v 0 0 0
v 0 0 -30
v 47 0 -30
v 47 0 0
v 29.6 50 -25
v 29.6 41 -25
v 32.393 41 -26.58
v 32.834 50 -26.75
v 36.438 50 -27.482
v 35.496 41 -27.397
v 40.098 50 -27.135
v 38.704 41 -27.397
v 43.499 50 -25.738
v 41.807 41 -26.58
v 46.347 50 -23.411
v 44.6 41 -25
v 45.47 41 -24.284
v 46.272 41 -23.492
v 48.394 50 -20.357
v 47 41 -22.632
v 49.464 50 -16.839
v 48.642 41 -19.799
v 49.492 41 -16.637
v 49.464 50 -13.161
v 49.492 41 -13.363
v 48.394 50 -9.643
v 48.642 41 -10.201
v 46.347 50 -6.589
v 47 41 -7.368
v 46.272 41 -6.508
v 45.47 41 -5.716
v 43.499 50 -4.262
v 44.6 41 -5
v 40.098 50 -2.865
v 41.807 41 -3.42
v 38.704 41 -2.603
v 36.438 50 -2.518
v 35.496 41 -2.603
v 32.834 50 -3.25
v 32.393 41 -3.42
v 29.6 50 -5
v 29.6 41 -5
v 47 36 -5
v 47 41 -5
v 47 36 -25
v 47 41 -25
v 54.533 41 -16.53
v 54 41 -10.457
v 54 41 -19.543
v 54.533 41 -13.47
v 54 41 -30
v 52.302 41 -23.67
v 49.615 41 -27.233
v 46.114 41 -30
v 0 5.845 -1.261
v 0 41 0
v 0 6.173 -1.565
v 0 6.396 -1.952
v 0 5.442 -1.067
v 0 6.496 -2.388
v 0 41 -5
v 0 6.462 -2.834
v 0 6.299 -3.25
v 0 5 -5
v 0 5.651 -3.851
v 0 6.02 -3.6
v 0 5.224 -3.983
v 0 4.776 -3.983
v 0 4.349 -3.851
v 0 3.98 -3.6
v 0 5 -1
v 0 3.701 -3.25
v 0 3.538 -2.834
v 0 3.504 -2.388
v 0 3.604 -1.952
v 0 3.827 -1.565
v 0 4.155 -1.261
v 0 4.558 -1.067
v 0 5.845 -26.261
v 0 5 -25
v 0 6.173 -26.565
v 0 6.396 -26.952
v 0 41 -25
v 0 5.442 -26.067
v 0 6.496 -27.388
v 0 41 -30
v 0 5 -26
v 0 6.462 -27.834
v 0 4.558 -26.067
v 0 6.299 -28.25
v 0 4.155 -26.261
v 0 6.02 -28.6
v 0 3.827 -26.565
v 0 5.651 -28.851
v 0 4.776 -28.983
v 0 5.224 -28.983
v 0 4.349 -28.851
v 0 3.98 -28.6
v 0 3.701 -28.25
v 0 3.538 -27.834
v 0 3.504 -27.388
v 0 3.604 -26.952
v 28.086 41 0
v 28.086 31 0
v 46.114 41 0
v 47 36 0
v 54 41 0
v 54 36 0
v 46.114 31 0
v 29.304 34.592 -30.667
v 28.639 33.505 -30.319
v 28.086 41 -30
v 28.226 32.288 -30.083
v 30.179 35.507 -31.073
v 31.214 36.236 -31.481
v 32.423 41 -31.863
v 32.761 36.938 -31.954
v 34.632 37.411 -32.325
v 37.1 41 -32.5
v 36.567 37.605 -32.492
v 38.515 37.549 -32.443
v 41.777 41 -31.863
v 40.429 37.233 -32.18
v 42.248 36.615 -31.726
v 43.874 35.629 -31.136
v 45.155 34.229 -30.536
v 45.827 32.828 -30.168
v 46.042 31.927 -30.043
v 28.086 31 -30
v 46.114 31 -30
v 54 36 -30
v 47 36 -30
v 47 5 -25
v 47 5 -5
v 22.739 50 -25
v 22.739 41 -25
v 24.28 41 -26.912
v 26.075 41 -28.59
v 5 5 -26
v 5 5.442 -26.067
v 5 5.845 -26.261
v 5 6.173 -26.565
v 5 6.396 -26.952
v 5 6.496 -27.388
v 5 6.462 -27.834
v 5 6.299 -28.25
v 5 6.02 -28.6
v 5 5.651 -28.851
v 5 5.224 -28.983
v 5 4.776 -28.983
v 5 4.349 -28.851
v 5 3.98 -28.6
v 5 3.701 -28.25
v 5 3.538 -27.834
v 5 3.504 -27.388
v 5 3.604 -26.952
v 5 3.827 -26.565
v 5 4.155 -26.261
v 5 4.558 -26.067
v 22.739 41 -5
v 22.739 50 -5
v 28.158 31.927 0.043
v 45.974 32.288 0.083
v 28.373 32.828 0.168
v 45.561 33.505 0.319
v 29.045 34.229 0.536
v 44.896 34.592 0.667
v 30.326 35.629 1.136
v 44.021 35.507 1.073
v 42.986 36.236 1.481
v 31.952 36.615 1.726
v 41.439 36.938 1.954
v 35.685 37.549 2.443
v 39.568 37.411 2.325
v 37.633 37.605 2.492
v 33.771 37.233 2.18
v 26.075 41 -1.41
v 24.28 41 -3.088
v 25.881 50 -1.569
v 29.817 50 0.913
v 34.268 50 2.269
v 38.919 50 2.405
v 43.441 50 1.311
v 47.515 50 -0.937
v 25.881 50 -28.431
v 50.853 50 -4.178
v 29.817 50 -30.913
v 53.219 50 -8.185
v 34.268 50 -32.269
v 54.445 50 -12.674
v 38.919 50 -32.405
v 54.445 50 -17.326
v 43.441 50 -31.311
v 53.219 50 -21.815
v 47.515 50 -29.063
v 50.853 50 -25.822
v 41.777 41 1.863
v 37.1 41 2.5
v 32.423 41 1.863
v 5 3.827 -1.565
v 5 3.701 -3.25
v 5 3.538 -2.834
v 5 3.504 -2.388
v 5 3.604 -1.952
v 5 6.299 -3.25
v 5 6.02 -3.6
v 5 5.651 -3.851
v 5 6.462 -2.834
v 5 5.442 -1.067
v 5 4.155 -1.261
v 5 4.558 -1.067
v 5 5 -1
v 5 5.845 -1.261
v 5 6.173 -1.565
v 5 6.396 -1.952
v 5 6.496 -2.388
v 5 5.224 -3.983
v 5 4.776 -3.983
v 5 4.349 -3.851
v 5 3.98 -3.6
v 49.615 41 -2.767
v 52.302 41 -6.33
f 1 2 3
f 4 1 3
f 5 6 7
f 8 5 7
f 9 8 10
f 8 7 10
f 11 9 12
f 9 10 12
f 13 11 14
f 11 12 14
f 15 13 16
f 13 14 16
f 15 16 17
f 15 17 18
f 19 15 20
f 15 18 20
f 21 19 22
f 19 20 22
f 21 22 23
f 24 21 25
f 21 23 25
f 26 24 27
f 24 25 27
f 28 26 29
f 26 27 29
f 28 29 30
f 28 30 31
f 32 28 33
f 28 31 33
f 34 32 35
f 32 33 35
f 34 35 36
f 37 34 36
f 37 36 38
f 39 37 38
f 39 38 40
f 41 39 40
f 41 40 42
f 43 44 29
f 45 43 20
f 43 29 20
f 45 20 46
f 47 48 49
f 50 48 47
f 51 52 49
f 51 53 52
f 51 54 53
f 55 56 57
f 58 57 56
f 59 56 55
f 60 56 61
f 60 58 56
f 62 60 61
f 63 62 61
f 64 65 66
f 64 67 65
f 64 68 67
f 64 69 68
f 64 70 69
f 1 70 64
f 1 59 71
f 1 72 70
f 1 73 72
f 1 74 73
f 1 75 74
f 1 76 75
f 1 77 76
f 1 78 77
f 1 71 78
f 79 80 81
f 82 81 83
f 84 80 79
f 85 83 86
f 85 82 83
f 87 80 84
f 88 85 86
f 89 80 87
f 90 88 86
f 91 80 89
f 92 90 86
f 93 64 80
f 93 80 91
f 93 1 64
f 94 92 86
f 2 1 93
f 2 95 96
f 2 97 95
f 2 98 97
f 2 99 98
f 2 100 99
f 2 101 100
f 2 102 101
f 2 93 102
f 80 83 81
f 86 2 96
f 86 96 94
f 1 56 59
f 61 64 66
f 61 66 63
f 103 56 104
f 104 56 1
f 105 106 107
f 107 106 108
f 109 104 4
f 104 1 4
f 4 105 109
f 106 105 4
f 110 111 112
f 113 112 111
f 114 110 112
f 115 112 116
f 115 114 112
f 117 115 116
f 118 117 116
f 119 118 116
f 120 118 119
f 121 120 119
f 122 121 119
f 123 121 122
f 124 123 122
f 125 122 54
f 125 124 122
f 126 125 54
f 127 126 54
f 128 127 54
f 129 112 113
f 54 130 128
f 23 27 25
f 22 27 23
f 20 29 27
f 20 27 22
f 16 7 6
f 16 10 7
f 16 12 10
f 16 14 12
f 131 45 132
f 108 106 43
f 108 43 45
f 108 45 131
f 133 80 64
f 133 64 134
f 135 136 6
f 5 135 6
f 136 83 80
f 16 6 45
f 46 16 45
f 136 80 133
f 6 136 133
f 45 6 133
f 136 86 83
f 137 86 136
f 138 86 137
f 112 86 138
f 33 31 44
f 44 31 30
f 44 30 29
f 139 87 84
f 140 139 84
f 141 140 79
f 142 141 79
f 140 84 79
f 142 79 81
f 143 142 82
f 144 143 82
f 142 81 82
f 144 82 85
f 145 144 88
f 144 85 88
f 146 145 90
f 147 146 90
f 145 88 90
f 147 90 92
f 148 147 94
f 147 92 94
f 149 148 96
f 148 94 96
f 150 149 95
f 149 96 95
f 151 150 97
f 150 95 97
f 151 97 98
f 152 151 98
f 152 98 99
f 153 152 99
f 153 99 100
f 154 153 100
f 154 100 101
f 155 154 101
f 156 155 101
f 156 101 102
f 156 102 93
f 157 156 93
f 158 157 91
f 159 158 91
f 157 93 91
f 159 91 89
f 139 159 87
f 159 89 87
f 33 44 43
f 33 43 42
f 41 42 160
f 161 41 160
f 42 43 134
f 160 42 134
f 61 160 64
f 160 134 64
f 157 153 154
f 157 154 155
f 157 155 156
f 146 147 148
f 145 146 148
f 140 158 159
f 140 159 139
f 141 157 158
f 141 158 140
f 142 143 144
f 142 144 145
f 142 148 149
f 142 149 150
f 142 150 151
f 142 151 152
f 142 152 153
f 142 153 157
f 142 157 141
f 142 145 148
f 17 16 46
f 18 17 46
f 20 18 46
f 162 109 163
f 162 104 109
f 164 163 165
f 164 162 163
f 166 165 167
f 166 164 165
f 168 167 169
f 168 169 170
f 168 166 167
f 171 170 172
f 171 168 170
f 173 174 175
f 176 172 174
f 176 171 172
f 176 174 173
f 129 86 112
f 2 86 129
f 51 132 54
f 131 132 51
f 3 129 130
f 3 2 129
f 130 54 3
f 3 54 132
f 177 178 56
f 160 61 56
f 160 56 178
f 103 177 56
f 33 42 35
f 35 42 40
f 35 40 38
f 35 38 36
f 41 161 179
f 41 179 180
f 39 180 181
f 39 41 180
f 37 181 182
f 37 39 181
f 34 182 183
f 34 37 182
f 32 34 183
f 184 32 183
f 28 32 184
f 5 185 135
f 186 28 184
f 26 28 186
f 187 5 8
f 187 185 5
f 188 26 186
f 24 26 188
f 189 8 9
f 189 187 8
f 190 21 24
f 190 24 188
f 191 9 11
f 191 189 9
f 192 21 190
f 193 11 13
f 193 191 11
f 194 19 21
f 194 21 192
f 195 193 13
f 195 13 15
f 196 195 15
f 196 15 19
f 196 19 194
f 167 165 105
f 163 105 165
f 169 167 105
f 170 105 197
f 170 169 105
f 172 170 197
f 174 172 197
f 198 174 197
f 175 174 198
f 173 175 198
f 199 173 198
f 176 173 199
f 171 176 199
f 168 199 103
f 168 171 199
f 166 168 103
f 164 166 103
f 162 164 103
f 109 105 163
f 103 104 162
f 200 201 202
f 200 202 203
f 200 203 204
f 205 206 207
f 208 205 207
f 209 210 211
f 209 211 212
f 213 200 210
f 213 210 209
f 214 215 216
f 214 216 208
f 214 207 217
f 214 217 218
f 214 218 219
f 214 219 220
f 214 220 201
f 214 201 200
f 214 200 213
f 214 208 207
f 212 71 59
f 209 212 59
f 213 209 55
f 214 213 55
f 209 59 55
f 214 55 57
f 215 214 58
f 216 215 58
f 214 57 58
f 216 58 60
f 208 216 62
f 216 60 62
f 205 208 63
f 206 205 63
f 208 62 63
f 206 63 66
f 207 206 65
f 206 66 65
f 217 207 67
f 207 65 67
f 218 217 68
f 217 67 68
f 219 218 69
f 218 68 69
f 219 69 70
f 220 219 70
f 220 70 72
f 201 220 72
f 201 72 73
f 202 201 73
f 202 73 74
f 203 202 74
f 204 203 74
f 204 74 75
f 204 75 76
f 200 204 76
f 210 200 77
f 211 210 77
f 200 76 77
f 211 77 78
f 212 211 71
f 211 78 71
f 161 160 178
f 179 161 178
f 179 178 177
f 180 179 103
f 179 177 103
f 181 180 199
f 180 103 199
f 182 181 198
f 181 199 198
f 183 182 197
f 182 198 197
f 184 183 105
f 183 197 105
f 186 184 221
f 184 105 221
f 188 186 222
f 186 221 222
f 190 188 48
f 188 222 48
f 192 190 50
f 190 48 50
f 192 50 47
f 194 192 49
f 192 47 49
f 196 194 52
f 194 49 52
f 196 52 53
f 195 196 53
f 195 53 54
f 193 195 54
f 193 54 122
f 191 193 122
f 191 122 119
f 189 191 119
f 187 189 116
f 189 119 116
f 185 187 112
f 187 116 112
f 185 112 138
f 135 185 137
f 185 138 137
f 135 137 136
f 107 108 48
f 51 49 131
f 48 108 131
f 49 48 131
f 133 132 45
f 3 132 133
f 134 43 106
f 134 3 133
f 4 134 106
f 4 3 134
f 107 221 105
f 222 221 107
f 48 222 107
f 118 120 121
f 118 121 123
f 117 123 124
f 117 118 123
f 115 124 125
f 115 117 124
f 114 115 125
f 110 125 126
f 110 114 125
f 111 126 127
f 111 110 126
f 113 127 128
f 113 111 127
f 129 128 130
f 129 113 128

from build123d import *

# Parameters (mm, degrees)
SKETCH1_W           = 54
SKETCH1_H           = 30
BOSS_EXTRUDE1_DEPTH = 5
SKETCH2_W           = 54
SKETCH2_H           = 5
BOSS_EXTRUDE2_DEPTH = 36
SKETCH3_W           = 7
SKETCH3_H           = 20
BOSS_EXTRUDE3_DEPTH = 10
SKETCH6_W           = 7
SKETCH6_H           = 30
CUT_EXTRUDE2_DEPTH  = 36
SKETCH7_R           = 1.5
CUT_EXTRUDE3_DEPTH  = 5
BOSS_EXTRUDE4_DEPTH = 9
FILLET1_R           = 10


with BuildPart() as part:
    # Sketch1 → Boss-Extrude1 (new body)
    with BuildSketch(Plane(origin=(0, 0, 0), x_dir=(1, 0, 0), z_dir=(0, 1, 0))):
        with Locations((27, 15)):
            Rectangle(SKETCH1_W, SKETCH1_H)
    extrude(amount=BOSS_EXTRUDE1_DEPTH)

    # Sketch2 → Boss-Extrude2 (add)
    with BuildSketch(Plane(origin=(0, 5, 0), x_dir=(1, 0, 0), z_dir=(0, 1, 0))):
        with Locations((27, 27.5)):
            Rectangle(SKETCH2_W, SKETCH2_H)
        with Locations((27, 2.5)):
            Rectangle(SKETCH2_W, SKETCH2_H)
    extrude(amount=BOSS_EXTRUDE2_DEPTH)

    # Sketch3 → Boss-Extrude3 (add)
    with BuildSketch(Plane(origin=(0, 41, 0), x_dir=(1, 0, 0), z_dir=(0, 1, 0))):
        with Locations((50.5, 15)):
            Rectangle(SKETCH3_W, SKETCH3_H)
    extrude(amount=-BOSS_EXTRUDE3_DEPTH)

    # Sketch6 → Cut-Extrude2 (cut)
    with BuildSketch(Plane.XZ):
        with Locations((50.5, -15)):
            Rectangle(SKETCH6_W, SKETCH6_H)
    extrude(amount=-CUT_EXTRUDE2_DEPTH, mode=Mode.SUBTRACT)

    # Sketch7 → Cut-Extrude3 (cut)
    with BuildSketch(Plane.ZY):
        with Locations((-27.5, 5)):
            Circle(SKETCH7_R)
        with Locations((-2.5, 5)):
            Circle(SKETCH7_R)
    extrude(amount=-CUT_EXTRUDE3_DEPTH, mode=Mode.SUBTRACT)

    # Sketch8 → Boss-Extrude4 (add)
    with BuildSketch(Plane(origin=(0, 41, 0), x_dir=(1, 0, 0), z_dir=(0, 1, 0))):
        with BuildLine():
            Line((22.738593384, 25), (29.6, 25))
            ThreePointArc((29.6, 25), (49.6, 15), (29.6, 5))
            Line((29.6, 5), (22.738593384, 5))
            ThreePointArc((22.738593384, 5), (54.6, 15), (22.738593384, 25))
        make_face()
    extrude(amount=BOSS_EXTRUDE4_DEPTH)

    # Fillet1
    # the kernel refuses this fillet: 10 mm, written as the material it adds along each edge
    with BuildSketch(Plane(origin=(3.086121811, 41, 0), x_dir=(0, -1, 0), z_dir=(1, 0, 0))) as fillet1_piece_1_section:
        with BuildLine():
            CenterArc((FILLET1_R, -FILLET1_R), FILLET1_R, 90, 90)
            Line((0, -FILLET1_R), (0, 0))
            Line((0, 0), (FILLET1_R, 0))
        make_face()
    fillet1_piece_1 = extrude(amount=68.027756377, mode=Mode.PRIVATE)
    fillet1_piece_1 = fillet1_piece_1 & Plane(origin=(37.1, 34.728997309, -15), x_dir=(-0.82065180664829, 0, 0.5714285714285713), z_dir=(0, -1, 0)) * Cylinder(17.5, 177, mode=Mode.PRIVATE)
    add(fillet1_piece_1)
    with BuildSketch(Plane(origin=(3.086121811, 41, -30), x_dir=(0, -1, 0), z_dir=(1, 0, 0))) as fillet1_piece_2_section:
        with BuildLine():
            CenterArc((FILLET1_R, FILLET1_R), FILLET1_R, 180, 90)
            Line((0, FILLET1_R), (0, 0))
            Line((0, 0), (FILLET1_R, 0))
        make_face()
    fillet1_piece_2 = extrude(amount=68.027756377, mode=Mode.PRIVATE)
    fillet1_piece_2 = fillet1_piece_2 & Plane(origin=(37.1, 34.728997309, -15), x_dir=(-0.82065180664829, 0, 0.5714285714285713), z_dir=(0, -1, 0)) * Cylinder(17.5, 177, mode=Mode.PRIVATE)
    add(fillet1_piece_2)


solid = part.part
